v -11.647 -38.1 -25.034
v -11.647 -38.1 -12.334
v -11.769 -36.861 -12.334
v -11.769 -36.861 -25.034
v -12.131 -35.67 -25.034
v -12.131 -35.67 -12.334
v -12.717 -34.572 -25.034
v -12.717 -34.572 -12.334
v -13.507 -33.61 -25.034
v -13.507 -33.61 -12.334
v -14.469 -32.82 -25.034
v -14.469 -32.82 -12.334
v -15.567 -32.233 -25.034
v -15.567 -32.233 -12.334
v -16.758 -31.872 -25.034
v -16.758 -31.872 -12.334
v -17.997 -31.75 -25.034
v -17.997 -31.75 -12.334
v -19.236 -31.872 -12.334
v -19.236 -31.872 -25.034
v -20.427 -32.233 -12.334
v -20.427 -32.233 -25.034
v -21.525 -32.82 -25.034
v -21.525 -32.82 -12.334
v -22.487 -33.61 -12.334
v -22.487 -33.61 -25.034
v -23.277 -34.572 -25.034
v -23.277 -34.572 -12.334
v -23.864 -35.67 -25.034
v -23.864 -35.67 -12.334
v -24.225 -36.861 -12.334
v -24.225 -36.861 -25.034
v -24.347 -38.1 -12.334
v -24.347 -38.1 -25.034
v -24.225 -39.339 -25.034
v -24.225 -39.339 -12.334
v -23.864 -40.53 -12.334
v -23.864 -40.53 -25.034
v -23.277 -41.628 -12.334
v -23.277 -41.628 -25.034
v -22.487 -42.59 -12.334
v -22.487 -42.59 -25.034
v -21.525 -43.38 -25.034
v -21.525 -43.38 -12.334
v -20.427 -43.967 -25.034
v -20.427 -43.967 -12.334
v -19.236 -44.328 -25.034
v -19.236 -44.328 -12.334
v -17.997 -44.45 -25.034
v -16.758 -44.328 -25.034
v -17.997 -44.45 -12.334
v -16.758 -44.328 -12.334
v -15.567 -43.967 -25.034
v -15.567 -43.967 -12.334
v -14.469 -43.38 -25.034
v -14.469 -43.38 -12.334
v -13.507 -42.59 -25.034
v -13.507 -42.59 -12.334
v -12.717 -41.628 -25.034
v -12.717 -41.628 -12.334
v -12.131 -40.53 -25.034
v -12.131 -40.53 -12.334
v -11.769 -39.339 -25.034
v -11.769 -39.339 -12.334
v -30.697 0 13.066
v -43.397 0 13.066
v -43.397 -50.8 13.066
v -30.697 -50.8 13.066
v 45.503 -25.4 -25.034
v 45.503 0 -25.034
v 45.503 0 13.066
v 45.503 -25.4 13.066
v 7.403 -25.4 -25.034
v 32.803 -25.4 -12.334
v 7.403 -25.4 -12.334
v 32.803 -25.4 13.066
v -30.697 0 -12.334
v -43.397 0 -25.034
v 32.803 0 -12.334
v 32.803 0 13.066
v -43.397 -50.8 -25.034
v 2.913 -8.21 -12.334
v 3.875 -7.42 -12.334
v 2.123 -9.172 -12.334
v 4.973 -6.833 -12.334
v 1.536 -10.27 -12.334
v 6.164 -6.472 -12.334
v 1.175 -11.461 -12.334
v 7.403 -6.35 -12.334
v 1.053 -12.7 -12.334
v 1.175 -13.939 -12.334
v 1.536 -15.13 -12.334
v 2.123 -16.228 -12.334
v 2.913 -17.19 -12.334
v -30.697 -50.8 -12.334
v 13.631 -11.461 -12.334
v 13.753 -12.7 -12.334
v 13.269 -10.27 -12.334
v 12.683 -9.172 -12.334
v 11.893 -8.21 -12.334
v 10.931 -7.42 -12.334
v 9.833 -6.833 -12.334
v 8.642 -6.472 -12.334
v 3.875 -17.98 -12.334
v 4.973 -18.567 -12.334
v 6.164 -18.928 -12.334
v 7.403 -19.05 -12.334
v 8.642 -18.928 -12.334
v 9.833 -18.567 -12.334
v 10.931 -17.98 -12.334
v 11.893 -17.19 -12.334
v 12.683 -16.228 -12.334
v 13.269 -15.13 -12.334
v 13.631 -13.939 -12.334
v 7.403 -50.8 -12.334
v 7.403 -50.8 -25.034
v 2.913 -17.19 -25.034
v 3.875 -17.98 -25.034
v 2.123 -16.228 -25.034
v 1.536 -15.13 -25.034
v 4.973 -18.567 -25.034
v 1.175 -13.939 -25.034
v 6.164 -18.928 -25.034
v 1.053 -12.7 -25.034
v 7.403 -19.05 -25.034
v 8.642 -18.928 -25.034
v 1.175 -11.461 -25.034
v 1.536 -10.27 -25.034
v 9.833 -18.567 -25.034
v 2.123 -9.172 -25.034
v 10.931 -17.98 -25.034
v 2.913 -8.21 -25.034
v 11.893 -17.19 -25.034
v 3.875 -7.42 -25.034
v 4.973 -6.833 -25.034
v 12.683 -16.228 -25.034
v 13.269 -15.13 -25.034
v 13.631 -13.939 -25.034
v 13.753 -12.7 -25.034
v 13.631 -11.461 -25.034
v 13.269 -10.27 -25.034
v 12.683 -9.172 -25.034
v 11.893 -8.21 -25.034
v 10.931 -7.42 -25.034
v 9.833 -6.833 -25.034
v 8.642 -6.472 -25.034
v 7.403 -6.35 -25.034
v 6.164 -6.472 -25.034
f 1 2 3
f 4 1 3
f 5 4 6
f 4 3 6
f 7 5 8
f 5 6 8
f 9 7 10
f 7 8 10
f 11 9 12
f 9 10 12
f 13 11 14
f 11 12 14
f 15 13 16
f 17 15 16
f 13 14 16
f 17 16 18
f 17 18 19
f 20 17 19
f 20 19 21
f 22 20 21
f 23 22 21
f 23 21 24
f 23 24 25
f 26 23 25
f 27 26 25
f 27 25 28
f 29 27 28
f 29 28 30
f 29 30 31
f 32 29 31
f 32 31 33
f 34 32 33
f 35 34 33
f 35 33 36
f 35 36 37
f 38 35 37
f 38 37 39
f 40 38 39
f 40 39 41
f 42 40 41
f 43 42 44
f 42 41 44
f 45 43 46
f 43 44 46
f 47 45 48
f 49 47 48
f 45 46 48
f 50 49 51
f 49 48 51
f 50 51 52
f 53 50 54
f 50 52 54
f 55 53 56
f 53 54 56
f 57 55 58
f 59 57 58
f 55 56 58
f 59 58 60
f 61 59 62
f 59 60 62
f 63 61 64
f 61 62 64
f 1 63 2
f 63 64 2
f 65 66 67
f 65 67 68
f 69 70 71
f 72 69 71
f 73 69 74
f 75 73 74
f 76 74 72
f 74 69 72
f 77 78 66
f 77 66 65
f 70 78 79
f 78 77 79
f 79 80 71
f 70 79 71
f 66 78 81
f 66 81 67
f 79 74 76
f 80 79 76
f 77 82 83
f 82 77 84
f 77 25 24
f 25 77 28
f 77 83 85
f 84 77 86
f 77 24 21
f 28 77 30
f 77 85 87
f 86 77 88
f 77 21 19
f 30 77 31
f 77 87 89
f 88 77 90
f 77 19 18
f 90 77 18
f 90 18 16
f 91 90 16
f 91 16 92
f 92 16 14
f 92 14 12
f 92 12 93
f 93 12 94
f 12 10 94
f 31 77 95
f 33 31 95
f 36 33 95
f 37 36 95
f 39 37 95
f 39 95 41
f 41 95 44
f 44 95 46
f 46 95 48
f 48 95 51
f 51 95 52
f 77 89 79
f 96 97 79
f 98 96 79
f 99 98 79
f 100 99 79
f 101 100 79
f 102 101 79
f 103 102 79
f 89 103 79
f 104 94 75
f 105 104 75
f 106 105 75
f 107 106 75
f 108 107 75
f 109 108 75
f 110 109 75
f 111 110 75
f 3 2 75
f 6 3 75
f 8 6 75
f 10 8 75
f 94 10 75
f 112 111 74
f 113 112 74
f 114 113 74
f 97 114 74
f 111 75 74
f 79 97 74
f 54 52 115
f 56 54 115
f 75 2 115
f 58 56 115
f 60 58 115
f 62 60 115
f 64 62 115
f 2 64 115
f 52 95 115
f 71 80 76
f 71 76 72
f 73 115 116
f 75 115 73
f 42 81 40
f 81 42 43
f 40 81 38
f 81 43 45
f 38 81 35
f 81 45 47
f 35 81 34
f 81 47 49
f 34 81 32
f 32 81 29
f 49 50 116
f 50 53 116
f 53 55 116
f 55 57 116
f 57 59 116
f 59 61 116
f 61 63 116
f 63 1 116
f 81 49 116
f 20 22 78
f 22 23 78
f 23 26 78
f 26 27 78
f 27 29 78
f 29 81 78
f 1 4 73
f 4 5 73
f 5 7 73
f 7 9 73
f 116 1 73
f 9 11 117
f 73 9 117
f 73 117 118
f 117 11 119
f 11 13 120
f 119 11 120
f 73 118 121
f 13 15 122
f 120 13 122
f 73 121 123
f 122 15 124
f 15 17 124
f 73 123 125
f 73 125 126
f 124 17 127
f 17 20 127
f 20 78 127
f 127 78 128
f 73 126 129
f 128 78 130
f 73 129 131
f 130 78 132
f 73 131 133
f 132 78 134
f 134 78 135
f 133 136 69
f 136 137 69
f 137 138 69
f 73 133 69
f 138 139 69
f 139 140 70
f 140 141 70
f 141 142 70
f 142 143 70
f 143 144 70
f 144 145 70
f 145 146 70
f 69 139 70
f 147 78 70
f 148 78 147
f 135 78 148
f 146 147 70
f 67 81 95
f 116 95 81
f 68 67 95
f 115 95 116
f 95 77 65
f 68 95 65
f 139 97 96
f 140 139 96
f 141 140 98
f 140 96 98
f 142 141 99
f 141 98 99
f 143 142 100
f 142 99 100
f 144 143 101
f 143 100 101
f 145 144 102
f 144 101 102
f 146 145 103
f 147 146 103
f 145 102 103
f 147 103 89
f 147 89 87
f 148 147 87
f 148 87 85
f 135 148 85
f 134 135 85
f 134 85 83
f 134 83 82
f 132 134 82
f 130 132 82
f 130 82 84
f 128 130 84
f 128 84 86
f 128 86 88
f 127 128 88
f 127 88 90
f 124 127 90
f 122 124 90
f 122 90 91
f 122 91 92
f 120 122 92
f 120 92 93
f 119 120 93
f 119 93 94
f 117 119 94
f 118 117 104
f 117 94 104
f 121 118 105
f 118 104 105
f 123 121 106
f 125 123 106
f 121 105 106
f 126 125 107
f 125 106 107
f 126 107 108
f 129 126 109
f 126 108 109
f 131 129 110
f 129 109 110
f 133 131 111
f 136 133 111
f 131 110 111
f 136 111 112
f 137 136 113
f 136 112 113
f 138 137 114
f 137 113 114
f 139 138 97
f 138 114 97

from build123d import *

# Parameters (mm, degrees)
F0_W     = 88.9
F0_H     = 38.1
F1_DEPTH = 50.8
F2_W     = 63.5
F2_H     = 25.4
F3_DEPTH = 50.8
F4_W     = 25.4
F4_H     = 38.1
F5_DEPTH = 38.1
F6_R     = 6.35
F7_DEPTH = 25.4
F8_R     = 6.35
F9_DEPTH = 25.4


with BuildPart() as f1:
    # F0 (on Front) → F1 (new body)
    with BuildSketch(Plane.XZ):
        with Locations((1.052767, -5.984174)):
            Rectangle(F0_W, F0_H)
    extrude(amount=F1_DEPTH)

    # F2 (on face) → F3 (cut)
    with BuildSketch(Plane.XZ.offset(50.8)):
        with Locations((1.052767, 0.365826)):
            Rectangle(F2_W, F2_H)
    extrude(amount=-F3_DEPTH, mode=Mode.SUBTRACT)

    # F4 (on face) → F5 (cut)
    with BuildSketch(Plane.YZ.offset(45.502767)):
        with Locations((-38.1, -5.984174)):
            Rectangle(F4_W, F4_H)
    extrude(amount=-F5_DEPTH, mode=Mode.SUBTRACT)

    # F6 (on face) → F7 (cut)
    with BuildSketch(Plane.XY.offset(-12.334174)):
        with Locations((-17.997233, -38.1)):
            Circle(F6_R)
    extrude(amount=-F7_DEPTH, mode=Mode.SUBTRACT)

    # F8 (on face) → F9 (cut)
    with BuildSketch(Plane.XY.offset(-12.334174)):
        with Locations((7.402767, -12.7)):
            Circle(F8_R)
    extrude(amount=-F9_DEPTH, mode=Mode.SUBTRACT)


solid = f1.part
